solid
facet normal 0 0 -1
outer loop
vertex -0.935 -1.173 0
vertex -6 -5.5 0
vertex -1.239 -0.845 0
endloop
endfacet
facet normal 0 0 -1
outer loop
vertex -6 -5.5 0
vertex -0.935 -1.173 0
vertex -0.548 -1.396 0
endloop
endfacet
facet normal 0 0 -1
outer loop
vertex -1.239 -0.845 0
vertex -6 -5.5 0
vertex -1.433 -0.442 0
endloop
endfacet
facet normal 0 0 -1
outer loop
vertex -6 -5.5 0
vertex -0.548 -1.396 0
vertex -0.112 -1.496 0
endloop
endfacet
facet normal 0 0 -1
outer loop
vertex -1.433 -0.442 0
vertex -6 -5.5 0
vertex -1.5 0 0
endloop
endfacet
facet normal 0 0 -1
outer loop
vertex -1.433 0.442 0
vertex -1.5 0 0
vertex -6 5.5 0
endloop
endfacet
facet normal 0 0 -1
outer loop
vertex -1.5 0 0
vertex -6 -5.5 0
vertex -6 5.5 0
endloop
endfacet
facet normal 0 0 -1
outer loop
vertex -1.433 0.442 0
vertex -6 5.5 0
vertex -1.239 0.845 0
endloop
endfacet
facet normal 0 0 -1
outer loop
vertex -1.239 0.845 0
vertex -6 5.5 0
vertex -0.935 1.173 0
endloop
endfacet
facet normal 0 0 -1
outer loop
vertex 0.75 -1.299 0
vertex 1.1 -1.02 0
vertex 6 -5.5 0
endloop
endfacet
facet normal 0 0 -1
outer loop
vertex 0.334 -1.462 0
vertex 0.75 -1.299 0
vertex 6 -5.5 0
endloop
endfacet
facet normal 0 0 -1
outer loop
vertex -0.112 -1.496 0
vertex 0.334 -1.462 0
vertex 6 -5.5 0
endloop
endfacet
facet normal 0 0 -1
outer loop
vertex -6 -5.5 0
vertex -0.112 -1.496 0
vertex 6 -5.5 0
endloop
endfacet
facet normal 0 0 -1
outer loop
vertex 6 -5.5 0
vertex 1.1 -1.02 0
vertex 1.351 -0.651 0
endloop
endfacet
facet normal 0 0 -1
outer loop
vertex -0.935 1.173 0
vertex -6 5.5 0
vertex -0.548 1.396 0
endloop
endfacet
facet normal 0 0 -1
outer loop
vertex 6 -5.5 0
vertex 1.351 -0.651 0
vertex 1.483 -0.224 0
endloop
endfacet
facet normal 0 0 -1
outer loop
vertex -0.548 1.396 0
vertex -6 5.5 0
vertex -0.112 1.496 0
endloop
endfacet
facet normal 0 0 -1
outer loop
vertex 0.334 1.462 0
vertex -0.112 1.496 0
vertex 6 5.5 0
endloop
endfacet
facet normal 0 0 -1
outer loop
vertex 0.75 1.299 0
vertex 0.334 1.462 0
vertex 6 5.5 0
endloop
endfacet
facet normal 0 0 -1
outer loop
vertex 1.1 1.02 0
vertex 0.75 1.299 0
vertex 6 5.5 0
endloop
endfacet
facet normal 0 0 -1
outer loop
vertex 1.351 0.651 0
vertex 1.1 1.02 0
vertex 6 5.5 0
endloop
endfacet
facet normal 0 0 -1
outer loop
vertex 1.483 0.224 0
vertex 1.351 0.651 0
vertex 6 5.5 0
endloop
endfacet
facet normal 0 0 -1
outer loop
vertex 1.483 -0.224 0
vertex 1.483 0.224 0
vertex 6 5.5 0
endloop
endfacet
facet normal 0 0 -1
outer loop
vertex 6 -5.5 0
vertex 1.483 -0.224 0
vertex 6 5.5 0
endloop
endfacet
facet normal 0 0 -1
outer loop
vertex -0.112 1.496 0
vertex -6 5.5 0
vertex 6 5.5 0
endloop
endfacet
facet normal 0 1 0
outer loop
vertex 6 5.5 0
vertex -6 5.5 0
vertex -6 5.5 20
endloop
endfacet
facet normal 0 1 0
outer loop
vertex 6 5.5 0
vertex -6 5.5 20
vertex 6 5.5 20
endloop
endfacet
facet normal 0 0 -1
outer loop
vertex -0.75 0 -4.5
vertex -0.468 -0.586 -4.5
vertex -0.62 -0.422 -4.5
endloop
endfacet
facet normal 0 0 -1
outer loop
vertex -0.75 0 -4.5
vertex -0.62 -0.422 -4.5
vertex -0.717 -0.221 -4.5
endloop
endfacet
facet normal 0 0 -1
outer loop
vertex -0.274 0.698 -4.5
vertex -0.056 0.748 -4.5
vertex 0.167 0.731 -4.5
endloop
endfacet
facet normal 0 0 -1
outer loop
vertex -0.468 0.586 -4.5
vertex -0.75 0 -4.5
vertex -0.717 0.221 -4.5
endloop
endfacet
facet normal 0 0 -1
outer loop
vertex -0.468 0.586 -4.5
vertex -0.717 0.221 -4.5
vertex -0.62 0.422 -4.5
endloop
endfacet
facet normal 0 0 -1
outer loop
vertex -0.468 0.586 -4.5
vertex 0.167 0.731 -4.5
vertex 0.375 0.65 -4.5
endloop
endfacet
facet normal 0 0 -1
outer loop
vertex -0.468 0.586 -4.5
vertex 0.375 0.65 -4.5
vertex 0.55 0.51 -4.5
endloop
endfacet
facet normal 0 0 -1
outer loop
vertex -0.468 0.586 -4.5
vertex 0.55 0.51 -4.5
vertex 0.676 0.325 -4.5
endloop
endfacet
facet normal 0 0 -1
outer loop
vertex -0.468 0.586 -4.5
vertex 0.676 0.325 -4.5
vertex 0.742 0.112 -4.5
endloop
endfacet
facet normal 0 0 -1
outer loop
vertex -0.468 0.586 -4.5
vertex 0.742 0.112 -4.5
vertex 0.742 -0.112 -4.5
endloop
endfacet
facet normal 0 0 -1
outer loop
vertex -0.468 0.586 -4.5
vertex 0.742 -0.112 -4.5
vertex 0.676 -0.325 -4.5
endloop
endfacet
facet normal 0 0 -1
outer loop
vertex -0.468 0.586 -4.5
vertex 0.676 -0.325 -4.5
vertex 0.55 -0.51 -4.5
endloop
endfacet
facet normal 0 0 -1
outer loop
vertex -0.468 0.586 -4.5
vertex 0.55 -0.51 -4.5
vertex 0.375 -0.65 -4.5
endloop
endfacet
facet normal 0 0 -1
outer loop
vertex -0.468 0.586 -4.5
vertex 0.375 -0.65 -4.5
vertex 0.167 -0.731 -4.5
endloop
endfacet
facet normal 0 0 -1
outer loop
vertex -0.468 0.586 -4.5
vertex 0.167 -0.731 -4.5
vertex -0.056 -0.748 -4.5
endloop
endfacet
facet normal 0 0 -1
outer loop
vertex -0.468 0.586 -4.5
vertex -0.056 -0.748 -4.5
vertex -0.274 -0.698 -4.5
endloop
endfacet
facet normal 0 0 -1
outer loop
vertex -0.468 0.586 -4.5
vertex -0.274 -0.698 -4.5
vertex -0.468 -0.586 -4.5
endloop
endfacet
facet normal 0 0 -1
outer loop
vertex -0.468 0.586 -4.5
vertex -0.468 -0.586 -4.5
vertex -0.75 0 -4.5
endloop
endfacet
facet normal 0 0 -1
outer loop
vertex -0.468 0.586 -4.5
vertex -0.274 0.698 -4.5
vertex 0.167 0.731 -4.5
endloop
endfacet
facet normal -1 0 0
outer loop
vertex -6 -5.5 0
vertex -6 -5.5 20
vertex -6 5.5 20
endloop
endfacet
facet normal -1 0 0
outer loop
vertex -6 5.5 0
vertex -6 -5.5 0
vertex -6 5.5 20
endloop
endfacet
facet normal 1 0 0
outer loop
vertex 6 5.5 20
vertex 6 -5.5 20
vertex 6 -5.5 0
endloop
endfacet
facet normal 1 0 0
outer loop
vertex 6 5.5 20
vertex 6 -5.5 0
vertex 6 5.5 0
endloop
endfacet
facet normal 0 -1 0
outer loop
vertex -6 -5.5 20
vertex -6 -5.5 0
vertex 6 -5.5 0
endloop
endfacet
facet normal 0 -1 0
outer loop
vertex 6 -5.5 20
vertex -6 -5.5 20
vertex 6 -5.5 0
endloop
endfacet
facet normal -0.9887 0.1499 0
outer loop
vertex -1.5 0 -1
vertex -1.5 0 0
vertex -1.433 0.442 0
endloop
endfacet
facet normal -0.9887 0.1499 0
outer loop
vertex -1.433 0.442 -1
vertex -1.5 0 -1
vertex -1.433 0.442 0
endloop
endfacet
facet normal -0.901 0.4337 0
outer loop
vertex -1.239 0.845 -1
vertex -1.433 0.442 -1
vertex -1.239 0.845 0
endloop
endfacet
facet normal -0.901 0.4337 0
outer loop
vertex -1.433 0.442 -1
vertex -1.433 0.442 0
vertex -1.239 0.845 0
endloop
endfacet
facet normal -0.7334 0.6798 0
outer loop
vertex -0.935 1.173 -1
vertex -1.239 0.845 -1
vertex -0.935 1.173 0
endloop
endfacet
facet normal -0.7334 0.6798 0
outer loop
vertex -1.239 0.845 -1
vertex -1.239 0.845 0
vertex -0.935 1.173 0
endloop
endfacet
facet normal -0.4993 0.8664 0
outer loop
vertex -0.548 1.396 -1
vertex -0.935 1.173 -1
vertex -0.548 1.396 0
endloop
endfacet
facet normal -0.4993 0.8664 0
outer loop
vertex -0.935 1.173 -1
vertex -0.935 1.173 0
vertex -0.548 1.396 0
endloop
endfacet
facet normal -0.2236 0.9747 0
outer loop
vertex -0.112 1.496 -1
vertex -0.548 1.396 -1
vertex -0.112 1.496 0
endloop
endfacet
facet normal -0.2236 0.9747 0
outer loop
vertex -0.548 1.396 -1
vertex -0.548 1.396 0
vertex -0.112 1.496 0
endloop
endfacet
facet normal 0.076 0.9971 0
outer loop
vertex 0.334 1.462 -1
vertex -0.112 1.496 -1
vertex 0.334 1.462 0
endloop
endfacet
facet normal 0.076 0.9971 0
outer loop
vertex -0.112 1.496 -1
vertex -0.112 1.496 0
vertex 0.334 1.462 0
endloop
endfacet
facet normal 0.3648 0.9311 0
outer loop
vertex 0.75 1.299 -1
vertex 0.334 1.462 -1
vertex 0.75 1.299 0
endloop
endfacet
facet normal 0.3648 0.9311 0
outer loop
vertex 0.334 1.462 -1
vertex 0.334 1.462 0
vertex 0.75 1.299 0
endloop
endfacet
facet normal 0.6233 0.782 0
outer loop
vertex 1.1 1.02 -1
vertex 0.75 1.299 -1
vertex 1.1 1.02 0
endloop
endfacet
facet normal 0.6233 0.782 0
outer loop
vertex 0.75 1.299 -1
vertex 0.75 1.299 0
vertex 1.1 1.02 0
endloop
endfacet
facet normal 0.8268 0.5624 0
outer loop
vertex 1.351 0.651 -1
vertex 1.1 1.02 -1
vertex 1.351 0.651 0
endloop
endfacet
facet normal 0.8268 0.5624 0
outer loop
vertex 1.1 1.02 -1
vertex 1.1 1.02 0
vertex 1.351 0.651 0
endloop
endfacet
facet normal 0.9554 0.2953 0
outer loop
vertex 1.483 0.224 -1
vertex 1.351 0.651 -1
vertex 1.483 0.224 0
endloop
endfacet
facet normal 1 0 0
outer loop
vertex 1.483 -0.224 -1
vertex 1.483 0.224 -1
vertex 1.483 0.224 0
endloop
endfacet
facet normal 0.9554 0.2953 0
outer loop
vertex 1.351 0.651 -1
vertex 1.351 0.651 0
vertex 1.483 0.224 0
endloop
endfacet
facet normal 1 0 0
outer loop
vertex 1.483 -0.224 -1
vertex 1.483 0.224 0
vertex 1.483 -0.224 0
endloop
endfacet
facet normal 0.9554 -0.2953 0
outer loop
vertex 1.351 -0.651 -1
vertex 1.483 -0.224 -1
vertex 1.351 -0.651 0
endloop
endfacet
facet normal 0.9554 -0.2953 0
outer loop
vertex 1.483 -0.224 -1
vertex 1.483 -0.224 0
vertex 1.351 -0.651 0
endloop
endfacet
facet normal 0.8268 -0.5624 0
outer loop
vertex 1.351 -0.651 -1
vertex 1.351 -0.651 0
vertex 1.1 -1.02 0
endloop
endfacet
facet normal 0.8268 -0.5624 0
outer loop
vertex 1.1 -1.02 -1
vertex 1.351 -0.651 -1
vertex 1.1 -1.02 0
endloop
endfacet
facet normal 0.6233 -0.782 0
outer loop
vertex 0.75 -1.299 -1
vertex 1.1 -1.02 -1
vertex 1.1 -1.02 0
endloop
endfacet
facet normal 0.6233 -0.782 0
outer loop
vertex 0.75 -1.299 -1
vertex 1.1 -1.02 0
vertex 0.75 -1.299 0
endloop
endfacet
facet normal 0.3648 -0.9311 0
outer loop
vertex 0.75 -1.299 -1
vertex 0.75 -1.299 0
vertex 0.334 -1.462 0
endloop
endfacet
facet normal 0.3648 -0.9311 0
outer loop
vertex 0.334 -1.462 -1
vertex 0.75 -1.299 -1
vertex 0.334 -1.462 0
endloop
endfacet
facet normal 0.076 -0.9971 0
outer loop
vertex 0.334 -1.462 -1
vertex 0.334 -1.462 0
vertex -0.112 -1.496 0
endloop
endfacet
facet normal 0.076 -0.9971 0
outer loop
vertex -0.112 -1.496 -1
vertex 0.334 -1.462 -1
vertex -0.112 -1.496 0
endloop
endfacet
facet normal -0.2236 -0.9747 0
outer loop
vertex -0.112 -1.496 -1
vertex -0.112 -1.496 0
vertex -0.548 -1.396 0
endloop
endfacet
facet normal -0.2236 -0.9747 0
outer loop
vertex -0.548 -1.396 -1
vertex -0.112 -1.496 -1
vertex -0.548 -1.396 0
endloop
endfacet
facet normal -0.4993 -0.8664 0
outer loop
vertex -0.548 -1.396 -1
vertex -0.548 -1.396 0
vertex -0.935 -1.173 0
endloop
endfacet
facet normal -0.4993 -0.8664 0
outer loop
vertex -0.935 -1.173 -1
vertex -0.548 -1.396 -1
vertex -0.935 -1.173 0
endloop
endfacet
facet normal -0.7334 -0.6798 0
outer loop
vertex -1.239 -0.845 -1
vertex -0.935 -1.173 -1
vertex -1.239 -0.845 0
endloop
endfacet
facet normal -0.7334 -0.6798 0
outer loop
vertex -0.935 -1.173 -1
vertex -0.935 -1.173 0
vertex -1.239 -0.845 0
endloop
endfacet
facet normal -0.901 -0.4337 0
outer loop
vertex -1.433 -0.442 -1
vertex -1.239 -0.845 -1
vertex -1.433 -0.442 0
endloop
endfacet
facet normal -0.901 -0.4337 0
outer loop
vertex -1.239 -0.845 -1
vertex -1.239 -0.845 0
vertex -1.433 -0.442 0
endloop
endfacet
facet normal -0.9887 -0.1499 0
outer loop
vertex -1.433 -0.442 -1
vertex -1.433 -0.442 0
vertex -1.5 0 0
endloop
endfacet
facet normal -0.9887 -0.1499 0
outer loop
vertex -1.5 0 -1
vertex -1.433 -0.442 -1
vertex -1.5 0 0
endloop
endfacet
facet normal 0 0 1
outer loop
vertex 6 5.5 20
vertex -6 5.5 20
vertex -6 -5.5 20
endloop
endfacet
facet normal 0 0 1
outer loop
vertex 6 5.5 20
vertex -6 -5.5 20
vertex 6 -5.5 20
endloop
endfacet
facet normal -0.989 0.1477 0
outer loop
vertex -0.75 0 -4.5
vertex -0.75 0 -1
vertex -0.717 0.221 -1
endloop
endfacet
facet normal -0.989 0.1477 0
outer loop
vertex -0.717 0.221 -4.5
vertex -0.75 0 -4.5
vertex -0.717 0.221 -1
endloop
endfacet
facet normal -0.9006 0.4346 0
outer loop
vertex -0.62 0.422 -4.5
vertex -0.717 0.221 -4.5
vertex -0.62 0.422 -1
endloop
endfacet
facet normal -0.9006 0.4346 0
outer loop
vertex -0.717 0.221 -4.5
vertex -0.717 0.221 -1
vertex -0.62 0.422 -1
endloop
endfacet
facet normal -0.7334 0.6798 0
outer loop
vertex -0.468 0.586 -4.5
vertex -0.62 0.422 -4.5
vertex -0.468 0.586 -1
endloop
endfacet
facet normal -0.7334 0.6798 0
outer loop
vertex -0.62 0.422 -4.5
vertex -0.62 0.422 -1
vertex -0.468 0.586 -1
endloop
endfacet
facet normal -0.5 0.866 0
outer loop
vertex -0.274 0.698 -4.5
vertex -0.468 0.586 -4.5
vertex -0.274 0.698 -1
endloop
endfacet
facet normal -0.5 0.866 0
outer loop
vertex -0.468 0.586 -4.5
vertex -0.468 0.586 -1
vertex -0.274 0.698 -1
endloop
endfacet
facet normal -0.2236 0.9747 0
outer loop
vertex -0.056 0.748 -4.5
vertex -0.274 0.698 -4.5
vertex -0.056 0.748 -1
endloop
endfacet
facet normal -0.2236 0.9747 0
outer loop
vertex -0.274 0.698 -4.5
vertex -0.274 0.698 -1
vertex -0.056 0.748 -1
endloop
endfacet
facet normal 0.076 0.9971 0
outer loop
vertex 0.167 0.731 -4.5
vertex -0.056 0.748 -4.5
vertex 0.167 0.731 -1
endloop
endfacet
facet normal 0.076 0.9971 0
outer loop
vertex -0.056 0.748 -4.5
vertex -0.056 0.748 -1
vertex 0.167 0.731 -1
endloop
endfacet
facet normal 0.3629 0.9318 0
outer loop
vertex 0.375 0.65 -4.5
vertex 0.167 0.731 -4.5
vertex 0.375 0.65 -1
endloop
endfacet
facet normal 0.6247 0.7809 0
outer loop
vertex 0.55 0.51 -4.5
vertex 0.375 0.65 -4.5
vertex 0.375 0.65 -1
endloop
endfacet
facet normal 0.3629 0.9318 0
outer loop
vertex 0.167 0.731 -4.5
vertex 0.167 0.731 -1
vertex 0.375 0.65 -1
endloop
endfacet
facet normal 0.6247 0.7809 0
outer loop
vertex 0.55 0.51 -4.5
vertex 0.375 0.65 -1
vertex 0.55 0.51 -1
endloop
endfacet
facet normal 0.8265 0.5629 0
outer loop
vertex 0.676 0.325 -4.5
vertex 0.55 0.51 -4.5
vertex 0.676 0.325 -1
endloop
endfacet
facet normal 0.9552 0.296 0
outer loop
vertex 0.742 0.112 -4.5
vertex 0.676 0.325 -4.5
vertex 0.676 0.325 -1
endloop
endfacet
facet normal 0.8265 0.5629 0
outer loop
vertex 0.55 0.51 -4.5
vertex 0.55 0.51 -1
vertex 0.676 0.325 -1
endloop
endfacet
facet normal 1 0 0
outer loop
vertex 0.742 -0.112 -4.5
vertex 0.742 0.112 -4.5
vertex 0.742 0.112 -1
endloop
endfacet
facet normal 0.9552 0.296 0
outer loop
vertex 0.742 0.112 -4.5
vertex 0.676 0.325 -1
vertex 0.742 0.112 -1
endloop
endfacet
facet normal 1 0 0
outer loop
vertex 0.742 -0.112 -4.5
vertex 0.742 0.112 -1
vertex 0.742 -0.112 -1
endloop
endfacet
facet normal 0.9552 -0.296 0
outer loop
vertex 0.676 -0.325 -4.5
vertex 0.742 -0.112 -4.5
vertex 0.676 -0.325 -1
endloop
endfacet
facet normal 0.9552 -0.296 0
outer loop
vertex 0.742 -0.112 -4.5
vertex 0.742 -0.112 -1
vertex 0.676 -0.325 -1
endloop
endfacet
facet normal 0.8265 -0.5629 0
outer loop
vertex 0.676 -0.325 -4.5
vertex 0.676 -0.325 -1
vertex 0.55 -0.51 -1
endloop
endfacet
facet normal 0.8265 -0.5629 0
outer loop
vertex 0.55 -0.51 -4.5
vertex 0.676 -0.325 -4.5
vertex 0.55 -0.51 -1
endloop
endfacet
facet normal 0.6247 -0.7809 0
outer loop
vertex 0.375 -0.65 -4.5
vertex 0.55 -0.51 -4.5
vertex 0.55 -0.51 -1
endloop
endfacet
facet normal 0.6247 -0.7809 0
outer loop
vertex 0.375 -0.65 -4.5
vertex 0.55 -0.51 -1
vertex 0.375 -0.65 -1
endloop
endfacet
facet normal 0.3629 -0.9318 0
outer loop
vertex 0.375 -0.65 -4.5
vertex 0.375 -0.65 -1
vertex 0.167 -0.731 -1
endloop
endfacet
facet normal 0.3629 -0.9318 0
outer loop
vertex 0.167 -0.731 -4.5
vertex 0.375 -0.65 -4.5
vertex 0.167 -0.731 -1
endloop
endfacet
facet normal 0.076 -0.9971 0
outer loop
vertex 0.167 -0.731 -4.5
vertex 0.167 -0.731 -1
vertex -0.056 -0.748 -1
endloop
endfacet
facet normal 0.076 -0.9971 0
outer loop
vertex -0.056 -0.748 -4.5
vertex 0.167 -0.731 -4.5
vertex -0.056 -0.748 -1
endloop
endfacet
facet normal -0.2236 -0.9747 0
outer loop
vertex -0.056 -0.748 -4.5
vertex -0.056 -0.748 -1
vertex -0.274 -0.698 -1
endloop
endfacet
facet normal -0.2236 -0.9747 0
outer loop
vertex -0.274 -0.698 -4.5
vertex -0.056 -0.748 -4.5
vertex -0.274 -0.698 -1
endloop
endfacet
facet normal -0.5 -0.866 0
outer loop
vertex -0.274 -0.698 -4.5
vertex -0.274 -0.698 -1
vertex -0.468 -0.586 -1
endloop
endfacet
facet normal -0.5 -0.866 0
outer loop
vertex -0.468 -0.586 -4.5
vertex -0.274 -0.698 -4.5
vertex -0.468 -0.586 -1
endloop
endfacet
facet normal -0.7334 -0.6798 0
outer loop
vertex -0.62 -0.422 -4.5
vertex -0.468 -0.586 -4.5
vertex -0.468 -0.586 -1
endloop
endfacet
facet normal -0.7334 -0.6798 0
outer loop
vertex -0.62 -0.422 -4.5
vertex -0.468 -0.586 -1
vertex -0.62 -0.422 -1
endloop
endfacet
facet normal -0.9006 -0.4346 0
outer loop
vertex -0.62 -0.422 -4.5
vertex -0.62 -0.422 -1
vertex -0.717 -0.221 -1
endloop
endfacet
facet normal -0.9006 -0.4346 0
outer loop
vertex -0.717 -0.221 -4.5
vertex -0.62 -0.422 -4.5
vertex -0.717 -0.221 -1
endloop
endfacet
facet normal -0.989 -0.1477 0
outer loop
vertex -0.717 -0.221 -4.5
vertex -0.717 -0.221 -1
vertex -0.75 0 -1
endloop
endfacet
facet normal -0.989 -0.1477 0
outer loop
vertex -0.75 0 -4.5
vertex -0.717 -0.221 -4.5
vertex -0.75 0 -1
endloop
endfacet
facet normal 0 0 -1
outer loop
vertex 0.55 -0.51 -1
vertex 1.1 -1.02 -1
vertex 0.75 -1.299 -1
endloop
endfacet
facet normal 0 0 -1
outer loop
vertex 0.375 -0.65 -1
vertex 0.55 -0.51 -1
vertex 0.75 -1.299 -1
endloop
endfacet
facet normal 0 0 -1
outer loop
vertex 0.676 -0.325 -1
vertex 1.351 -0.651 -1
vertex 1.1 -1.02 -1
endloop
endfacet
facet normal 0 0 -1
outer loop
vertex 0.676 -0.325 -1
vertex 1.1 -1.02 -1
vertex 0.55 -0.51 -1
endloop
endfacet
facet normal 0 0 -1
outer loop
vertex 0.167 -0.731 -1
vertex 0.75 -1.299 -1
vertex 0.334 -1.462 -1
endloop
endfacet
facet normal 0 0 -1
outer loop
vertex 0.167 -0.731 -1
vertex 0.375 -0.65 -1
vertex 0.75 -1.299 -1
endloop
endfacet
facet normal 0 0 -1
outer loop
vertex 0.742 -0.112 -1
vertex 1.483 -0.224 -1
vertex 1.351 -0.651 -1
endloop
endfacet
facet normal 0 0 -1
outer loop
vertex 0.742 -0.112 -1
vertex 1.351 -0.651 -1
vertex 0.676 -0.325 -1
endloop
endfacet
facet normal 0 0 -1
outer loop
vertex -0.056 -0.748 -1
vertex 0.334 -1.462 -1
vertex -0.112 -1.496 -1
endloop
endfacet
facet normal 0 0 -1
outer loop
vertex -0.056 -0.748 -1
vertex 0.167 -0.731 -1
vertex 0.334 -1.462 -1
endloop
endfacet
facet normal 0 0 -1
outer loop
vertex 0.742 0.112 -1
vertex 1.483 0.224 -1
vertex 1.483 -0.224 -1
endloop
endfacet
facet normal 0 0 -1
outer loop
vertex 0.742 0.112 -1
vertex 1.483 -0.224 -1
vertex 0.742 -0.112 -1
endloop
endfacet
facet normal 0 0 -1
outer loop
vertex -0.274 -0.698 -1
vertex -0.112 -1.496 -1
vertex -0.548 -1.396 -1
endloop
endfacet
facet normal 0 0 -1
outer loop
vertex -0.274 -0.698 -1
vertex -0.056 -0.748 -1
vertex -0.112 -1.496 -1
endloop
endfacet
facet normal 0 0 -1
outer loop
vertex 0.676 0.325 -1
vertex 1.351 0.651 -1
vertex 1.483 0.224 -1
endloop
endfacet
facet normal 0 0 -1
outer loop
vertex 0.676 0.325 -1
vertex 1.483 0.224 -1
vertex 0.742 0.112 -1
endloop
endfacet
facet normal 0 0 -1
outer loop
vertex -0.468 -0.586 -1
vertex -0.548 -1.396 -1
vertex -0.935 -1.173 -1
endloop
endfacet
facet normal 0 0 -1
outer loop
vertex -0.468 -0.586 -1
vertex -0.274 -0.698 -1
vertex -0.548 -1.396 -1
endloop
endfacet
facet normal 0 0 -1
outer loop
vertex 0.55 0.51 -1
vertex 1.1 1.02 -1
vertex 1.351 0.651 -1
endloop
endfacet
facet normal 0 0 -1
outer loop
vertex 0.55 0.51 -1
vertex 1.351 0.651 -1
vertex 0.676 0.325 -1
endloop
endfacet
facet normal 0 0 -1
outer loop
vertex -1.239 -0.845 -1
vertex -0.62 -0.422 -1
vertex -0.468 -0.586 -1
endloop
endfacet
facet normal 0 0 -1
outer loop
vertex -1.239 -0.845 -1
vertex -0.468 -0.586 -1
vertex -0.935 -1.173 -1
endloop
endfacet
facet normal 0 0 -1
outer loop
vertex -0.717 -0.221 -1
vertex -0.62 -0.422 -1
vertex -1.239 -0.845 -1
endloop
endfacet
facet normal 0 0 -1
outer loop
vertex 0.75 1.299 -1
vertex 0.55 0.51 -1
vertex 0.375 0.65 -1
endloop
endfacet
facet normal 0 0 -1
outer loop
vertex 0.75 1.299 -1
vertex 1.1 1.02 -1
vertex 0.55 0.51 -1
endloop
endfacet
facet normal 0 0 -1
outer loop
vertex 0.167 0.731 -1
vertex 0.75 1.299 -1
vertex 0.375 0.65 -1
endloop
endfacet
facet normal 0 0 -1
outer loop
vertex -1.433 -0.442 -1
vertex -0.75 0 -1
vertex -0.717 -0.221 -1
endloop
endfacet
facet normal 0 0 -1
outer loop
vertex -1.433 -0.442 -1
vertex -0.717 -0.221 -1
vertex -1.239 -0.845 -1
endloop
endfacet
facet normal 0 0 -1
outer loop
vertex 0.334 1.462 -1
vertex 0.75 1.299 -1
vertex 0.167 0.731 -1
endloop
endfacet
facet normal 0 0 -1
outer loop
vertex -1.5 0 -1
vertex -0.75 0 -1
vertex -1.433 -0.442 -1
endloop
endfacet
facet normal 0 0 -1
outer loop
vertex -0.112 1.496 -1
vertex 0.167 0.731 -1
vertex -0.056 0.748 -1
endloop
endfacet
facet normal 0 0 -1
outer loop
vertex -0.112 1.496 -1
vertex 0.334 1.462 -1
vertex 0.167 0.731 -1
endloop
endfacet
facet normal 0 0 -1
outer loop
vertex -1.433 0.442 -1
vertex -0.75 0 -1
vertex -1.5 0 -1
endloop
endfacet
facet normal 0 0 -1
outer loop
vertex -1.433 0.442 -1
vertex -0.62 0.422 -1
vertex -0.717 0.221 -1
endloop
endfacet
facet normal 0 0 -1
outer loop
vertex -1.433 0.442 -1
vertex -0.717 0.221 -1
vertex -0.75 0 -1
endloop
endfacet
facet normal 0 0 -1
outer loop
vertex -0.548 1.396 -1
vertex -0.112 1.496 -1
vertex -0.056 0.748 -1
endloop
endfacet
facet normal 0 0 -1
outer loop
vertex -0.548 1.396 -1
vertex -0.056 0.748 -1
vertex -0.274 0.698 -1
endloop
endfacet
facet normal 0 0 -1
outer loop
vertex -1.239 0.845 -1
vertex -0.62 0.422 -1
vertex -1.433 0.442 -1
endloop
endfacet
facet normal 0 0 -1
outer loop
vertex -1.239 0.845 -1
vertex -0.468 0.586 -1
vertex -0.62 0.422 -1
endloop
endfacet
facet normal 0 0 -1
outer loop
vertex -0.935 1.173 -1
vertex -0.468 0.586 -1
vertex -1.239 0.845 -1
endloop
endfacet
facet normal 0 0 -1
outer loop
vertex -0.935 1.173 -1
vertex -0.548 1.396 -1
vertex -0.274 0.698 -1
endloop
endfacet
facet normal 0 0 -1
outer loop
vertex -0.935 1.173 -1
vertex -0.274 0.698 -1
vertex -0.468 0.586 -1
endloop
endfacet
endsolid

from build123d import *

# Parameters (mm, degrees)
SKETCH_1_W      = 12
SKETCH_1_H      = 11
EXTRUDE_1_DEPTH = 20
SKETCH_2_R      = 1.5
EXTRUDE_2_DEPTH = 1
SKETCH_3_R      = 0.75
EXTRUDE_3_DEPTH = 4.5


with BuildPart() as part:
    # ｽｹｯﾁ1 → ﾎﾞｽ - 押し出し1 (new body)
    with BuildSketch(Plane.XY):
        Rectangle(SKETCH_1_W, SKETCH_1_H)
    extrude(amount=EXTRUDE_1_DEPTH)

    # ｽｹｯﾁ2 → ﾎﾞｽ - 押し出し2 (add)
    with BuildSketch(Plane(origin=(0, 0, 0), x_dir=(-1, 0, 0), z_dir=(0, 0, -1))):
        Circle(SKETCH_2_R)
    extrude(amount=EXTRUDE_2_DEPTH)

    # ｽｹｯﾁ3 → ﾎﾞｽ - 押し出し3 (add)
    with BuildSketch(Plane(origin=(0, 0, 0), x_dir=(-1, 0, 0), z_dir=(0, 0, -1))):
        Circle(SKETCH_3_R)
    extrude(amount=EXTRUDE_3_DEPTH)


solid = part.part
